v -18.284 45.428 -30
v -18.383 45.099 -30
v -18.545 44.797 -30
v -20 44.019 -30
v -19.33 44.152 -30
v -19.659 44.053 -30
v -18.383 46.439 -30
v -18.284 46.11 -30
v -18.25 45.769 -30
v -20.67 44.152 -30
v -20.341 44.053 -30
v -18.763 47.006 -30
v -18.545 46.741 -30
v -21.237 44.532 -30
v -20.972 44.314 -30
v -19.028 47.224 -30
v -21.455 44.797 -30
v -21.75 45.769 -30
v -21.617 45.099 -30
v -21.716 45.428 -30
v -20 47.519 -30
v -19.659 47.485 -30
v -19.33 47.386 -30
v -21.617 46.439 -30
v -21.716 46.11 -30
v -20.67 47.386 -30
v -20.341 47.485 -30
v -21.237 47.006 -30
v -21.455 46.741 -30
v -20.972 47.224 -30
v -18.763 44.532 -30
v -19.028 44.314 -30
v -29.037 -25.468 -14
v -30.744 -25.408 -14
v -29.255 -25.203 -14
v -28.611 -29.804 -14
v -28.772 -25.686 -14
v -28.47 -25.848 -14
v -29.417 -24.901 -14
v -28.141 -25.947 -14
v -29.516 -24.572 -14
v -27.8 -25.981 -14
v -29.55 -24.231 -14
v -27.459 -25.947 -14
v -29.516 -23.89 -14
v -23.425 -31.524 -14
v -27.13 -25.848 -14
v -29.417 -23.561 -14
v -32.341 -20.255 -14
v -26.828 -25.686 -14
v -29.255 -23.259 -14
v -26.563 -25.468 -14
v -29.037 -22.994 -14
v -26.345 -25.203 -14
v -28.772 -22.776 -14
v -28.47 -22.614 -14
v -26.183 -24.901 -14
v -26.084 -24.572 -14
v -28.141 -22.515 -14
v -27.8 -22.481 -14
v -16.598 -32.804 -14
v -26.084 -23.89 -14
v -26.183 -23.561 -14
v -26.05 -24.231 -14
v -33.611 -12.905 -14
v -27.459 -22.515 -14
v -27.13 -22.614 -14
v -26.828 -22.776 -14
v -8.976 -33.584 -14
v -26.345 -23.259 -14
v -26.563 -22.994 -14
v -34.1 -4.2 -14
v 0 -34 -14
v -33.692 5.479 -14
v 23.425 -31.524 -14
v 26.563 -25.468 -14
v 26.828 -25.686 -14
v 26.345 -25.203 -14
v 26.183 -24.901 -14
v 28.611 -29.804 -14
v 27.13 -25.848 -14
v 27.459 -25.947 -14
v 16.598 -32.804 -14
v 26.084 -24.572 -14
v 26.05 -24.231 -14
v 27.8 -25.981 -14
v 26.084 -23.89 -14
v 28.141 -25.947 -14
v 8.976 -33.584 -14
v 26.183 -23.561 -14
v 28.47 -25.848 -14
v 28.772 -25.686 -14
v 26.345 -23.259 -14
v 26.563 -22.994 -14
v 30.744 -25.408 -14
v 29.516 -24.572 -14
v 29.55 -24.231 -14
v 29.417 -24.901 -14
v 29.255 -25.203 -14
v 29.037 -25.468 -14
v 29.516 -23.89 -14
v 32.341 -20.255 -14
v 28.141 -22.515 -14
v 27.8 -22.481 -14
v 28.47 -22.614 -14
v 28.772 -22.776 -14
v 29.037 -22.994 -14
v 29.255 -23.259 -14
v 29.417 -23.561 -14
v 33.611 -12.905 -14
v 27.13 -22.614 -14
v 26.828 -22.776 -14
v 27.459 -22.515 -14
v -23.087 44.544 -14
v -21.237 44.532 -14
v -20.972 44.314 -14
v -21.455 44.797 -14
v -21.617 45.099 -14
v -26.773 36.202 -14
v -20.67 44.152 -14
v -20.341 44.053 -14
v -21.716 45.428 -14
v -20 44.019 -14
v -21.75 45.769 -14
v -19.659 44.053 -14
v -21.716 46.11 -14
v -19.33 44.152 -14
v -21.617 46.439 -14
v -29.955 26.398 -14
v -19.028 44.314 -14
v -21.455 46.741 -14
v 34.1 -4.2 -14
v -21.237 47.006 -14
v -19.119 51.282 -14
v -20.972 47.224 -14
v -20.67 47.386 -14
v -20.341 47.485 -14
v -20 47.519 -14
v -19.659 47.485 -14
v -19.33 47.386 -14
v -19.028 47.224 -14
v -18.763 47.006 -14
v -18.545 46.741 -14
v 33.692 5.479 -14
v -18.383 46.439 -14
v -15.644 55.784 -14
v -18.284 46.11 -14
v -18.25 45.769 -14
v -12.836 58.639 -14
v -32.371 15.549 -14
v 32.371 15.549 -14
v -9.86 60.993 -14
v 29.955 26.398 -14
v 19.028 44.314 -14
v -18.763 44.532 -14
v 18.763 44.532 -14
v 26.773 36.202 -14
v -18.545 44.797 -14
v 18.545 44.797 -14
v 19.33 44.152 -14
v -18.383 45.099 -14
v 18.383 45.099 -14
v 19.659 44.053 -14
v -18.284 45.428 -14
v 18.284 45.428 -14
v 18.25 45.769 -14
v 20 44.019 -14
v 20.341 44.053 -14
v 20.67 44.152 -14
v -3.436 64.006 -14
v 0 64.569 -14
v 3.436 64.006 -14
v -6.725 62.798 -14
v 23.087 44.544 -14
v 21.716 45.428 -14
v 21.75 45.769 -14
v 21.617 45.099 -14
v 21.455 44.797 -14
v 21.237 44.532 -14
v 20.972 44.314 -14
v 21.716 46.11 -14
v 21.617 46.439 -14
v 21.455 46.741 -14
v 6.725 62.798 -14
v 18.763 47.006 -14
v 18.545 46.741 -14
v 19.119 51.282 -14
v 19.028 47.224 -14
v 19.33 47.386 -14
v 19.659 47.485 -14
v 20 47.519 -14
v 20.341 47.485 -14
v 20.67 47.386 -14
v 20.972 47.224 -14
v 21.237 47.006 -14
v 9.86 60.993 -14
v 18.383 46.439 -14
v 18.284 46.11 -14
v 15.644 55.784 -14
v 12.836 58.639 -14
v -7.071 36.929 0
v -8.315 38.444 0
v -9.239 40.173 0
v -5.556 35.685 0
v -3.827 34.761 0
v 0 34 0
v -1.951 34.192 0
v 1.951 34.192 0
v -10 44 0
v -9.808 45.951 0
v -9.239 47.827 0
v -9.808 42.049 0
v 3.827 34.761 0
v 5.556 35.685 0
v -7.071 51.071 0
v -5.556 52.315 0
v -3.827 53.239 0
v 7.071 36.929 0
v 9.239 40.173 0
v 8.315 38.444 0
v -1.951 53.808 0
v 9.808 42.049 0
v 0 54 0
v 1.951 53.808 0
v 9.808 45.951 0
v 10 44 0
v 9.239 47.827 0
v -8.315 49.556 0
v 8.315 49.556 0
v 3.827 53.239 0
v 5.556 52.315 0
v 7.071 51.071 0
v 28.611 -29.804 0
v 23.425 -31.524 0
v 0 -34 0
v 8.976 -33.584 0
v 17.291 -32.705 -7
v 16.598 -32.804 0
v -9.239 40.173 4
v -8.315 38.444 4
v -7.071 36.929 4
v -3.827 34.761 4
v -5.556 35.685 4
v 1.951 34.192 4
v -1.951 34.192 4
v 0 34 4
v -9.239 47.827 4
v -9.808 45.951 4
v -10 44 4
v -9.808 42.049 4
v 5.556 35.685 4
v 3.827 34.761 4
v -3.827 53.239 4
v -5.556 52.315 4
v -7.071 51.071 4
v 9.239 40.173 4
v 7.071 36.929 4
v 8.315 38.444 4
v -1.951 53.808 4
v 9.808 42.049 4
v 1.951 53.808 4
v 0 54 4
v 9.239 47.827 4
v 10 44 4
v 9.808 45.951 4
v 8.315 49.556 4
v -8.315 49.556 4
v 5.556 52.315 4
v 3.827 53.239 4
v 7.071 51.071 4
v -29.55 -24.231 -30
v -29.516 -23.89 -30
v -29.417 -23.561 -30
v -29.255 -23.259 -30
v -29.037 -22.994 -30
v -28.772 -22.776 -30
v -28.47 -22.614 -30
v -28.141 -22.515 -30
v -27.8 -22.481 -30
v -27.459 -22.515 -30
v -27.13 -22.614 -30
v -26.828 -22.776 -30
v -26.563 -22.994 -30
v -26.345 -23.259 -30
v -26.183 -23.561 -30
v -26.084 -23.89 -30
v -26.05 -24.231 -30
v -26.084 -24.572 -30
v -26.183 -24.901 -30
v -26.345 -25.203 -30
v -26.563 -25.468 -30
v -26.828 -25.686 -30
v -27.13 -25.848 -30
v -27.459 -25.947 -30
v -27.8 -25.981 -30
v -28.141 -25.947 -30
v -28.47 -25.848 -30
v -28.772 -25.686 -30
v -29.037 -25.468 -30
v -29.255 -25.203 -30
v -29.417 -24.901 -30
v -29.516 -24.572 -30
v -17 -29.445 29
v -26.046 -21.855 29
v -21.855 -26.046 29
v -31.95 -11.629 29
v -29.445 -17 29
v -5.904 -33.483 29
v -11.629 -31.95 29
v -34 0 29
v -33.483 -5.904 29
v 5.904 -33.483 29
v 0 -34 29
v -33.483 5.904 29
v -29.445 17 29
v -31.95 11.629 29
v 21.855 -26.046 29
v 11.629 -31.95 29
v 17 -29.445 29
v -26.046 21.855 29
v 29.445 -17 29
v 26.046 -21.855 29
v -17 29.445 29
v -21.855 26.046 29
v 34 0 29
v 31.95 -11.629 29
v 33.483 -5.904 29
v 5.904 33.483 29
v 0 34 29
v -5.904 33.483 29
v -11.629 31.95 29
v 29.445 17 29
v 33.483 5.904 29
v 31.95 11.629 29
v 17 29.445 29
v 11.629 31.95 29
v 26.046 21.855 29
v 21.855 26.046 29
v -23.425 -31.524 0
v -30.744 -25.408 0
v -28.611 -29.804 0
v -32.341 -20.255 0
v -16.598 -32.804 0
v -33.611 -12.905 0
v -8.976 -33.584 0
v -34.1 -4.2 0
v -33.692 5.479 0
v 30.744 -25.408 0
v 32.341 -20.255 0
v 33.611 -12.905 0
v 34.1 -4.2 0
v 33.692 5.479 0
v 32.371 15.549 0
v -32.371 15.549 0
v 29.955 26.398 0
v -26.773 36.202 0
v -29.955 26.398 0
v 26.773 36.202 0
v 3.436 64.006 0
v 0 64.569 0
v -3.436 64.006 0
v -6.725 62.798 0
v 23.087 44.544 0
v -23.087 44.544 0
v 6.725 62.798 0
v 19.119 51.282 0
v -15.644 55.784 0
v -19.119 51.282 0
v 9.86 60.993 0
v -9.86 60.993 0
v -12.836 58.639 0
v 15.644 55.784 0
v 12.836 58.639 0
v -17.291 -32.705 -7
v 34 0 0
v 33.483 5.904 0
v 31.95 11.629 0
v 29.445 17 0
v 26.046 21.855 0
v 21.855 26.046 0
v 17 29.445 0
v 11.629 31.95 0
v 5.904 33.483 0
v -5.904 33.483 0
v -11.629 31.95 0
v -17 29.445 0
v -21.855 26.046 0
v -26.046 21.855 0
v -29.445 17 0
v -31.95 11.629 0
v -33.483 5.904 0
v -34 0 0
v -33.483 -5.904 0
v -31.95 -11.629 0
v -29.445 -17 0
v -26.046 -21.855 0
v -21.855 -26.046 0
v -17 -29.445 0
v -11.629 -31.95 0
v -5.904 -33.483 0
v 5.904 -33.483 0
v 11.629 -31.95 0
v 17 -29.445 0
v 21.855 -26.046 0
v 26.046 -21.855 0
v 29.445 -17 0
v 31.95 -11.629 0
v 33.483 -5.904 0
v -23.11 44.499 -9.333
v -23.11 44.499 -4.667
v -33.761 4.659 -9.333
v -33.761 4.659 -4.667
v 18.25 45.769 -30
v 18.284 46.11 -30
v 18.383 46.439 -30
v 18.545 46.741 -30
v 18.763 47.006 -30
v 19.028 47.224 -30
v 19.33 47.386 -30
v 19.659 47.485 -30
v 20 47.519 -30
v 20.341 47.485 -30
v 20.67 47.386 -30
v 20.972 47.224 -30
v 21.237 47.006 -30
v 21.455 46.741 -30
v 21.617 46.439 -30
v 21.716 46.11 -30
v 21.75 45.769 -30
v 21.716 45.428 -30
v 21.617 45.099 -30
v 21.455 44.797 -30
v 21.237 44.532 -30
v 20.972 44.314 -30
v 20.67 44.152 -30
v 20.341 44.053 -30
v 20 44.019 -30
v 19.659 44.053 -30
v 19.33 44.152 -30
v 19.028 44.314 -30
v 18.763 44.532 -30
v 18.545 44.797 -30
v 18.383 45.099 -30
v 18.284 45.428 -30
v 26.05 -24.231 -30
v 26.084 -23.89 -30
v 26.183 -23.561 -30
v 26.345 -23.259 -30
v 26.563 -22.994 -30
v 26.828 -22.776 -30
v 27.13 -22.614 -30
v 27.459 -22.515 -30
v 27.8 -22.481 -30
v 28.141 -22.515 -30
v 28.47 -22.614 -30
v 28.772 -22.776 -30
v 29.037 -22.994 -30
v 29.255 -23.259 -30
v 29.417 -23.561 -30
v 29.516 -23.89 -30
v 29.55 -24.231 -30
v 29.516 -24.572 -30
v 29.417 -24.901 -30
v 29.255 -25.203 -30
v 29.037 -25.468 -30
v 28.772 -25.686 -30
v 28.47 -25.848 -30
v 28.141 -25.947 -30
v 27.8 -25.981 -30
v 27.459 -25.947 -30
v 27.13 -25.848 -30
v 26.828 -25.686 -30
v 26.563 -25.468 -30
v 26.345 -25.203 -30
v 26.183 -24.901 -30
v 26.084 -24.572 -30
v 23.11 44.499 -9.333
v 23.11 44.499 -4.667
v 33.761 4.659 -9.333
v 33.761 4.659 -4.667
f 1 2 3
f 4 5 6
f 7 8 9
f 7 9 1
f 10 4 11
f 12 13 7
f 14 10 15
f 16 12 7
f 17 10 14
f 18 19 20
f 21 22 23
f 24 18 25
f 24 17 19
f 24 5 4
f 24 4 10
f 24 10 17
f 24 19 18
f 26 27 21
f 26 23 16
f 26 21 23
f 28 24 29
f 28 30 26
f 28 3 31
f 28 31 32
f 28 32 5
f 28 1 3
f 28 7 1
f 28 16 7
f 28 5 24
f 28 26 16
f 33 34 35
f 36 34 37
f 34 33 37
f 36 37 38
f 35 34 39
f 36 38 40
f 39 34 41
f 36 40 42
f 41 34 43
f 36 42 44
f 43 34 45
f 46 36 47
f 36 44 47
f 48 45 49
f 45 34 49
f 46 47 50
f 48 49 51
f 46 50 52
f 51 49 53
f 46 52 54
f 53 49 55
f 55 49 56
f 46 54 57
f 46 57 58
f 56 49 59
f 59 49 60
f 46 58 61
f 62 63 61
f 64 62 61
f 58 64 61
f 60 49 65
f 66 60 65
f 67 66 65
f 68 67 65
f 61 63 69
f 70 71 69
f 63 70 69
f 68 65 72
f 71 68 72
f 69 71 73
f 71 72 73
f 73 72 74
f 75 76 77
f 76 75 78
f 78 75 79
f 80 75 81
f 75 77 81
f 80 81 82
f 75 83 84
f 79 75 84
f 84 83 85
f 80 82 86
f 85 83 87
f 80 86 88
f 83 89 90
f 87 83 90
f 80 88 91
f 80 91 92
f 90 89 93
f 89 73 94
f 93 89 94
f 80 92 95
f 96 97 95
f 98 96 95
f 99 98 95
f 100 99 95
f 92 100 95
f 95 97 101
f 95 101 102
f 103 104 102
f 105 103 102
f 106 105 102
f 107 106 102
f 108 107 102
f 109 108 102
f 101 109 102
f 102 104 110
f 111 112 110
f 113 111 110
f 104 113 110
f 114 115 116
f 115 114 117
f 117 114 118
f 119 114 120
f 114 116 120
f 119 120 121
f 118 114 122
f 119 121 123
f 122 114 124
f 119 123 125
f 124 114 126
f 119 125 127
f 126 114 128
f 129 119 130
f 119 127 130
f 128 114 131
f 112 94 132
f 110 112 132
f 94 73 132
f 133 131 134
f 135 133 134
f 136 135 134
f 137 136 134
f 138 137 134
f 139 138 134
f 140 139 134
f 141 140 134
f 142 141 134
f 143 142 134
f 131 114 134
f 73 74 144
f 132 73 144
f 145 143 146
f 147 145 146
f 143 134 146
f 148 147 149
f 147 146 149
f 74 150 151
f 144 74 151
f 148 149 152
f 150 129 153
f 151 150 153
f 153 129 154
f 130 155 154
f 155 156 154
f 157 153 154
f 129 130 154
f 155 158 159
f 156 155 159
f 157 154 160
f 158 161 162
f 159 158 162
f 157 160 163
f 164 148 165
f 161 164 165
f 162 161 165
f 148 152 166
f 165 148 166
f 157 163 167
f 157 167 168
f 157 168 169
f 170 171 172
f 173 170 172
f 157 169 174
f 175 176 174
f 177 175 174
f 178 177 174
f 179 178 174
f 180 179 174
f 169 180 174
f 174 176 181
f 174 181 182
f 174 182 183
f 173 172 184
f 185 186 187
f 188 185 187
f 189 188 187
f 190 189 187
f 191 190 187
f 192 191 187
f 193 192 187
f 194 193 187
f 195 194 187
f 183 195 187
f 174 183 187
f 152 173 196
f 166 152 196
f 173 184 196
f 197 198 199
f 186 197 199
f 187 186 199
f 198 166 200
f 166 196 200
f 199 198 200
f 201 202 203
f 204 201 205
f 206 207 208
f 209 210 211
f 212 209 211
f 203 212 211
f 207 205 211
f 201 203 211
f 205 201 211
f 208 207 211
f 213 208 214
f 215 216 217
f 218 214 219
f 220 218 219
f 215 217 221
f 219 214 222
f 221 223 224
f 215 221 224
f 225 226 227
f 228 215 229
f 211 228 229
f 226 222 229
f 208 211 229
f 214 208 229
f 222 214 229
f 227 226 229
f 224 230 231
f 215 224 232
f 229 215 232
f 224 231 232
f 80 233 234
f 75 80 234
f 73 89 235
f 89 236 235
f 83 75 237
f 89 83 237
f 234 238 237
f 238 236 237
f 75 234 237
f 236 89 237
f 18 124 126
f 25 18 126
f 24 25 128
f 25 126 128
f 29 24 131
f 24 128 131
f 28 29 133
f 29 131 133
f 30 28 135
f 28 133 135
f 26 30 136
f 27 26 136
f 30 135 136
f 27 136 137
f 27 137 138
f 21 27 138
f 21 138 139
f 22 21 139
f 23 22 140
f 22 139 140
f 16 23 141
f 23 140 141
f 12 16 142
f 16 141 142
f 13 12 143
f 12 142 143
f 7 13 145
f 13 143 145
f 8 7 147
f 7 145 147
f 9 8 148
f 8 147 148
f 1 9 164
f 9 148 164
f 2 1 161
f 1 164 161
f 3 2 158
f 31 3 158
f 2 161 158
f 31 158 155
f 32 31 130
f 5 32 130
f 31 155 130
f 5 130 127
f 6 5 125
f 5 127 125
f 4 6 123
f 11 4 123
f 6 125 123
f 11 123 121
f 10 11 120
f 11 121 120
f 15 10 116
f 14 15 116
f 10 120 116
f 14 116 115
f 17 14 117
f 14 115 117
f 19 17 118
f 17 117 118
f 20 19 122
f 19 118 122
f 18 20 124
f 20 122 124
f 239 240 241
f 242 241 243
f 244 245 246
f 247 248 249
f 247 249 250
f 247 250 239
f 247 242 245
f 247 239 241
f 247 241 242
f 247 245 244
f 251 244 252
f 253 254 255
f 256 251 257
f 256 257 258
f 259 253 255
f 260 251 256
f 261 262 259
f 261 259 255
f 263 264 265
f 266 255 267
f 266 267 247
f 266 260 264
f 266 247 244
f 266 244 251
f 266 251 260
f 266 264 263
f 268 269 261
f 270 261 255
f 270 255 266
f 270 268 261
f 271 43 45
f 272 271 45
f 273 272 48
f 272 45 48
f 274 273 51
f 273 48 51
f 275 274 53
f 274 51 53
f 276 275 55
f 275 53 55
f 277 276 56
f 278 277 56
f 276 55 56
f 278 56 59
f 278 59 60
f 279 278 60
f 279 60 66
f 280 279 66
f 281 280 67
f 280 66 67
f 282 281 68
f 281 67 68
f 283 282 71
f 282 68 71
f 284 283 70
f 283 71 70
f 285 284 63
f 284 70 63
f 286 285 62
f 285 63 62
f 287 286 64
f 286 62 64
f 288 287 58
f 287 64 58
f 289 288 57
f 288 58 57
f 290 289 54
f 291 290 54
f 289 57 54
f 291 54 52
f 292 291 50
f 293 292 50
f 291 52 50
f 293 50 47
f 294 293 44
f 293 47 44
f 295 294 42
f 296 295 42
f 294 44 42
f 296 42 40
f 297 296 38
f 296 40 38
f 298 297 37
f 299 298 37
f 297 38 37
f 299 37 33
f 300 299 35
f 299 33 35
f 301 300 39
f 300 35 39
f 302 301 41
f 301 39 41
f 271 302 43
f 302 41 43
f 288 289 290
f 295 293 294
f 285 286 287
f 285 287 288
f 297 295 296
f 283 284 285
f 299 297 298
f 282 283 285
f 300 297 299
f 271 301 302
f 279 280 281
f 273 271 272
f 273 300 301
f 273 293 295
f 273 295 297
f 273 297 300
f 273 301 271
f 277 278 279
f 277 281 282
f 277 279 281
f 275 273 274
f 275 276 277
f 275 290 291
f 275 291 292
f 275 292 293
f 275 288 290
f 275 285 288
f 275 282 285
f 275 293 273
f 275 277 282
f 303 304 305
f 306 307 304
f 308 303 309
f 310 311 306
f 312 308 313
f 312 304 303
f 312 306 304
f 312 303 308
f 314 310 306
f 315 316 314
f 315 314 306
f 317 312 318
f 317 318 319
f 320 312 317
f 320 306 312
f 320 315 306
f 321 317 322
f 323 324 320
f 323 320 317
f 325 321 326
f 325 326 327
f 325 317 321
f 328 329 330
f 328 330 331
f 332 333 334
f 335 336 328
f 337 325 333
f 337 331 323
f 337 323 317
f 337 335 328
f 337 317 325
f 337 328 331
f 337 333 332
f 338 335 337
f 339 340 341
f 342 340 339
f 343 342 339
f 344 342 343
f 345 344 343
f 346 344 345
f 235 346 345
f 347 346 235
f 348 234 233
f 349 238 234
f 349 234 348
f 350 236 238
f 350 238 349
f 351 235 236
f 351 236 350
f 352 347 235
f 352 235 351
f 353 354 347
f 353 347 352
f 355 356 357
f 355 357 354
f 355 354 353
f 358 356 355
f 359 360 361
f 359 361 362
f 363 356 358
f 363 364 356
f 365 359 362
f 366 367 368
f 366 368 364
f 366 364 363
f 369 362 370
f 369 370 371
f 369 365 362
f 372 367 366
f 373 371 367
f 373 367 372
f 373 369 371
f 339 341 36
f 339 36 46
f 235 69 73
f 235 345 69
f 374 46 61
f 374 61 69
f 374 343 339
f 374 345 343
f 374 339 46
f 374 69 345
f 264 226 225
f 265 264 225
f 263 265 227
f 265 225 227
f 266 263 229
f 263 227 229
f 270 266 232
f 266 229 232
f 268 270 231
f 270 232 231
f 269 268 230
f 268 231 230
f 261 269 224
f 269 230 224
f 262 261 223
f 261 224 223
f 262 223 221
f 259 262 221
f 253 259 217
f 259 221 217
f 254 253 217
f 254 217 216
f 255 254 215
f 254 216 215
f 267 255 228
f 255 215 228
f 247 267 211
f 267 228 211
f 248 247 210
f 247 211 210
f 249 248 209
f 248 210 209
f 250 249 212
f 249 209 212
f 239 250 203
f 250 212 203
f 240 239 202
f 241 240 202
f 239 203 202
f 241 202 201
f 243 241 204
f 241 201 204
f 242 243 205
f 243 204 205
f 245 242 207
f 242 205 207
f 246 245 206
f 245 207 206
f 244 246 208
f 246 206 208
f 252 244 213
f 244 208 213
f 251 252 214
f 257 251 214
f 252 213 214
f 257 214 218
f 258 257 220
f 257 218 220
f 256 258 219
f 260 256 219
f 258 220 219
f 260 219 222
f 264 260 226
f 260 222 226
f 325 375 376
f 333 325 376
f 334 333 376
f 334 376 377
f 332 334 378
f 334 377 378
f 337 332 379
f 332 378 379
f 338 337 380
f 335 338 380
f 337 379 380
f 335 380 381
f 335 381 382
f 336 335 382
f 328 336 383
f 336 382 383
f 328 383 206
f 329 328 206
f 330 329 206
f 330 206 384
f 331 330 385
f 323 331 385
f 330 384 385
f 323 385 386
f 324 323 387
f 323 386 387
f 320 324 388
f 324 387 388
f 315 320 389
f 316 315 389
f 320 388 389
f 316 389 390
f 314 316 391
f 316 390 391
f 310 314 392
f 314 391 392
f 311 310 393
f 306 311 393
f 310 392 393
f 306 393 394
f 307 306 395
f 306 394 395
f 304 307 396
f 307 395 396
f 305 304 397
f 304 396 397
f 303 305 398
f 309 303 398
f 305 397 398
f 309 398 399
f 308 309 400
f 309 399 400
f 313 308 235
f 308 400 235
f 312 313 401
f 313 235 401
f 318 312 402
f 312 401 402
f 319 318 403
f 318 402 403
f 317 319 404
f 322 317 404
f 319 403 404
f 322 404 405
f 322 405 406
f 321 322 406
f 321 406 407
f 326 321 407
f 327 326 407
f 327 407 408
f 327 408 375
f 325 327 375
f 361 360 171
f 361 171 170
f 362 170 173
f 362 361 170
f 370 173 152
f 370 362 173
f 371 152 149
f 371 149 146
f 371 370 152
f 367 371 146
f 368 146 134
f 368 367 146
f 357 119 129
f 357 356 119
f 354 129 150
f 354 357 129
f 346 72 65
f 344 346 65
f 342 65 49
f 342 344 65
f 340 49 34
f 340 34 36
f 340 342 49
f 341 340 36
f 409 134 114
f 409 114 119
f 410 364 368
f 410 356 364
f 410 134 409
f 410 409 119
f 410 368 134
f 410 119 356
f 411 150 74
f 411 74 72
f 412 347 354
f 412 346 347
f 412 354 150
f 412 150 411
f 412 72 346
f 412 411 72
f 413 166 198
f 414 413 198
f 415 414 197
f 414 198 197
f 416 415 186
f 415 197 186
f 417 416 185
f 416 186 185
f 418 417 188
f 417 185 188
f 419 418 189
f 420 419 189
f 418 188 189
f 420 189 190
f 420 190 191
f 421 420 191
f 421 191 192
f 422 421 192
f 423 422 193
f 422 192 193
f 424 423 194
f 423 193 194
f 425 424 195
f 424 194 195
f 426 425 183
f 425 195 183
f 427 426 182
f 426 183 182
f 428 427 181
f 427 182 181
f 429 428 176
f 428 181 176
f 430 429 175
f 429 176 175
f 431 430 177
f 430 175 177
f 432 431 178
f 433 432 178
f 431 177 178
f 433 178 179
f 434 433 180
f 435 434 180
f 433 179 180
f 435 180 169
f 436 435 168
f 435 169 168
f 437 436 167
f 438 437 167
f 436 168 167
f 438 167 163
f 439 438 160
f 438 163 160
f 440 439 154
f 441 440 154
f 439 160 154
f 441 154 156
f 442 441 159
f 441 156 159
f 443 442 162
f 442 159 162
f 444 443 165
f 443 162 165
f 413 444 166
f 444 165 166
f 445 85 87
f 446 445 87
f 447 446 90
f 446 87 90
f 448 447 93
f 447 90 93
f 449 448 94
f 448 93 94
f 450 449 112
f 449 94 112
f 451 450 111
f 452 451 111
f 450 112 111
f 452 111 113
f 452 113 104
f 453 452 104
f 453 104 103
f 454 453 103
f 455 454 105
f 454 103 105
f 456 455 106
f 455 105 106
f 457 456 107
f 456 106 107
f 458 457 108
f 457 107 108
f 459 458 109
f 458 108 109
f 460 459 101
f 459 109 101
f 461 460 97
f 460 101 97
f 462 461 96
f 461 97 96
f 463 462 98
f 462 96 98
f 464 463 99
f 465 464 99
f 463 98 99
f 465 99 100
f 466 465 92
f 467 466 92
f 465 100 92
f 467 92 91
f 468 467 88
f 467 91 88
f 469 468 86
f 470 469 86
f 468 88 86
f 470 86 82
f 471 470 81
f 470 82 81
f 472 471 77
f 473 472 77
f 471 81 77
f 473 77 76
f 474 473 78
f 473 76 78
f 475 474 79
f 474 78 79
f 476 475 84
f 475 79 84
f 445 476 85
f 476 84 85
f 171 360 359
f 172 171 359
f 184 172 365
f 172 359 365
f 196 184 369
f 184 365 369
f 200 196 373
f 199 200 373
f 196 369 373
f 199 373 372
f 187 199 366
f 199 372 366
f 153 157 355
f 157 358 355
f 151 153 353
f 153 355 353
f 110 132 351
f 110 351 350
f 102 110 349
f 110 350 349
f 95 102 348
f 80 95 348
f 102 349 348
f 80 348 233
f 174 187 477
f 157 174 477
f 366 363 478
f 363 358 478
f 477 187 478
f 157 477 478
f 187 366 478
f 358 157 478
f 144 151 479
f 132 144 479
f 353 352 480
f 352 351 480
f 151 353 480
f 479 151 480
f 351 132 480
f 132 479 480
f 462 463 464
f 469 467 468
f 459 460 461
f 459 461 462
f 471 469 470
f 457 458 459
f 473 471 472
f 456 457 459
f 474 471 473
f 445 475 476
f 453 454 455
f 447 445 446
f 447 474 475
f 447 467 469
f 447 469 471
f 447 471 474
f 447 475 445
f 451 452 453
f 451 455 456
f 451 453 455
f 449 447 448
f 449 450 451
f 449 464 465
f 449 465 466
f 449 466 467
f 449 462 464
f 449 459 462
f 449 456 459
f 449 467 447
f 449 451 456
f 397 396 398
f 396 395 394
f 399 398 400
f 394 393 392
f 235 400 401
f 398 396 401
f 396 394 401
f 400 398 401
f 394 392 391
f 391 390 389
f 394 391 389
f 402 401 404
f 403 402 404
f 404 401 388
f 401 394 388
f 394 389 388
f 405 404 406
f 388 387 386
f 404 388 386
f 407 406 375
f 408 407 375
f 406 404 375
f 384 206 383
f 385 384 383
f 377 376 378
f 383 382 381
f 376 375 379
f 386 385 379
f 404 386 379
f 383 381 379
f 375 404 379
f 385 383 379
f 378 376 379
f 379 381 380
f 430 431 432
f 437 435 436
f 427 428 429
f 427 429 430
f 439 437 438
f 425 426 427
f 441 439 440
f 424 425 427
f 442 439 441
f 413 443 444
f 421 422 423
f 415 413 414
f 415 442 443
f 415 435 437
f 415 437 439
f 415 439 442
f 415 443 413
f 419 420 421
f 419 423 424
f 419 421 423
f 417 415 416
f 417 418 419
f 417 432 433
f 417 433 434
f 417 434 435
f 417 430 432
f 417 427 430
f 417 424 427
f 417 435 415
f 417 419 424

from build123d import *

# Parameters (mm, degrees)
SKETCH_1_R      = 34
EXTRUDE_2_DEPTH = 29
SKETCH_4_R      = 10
EXTRUDE_3_DEPTH = 4
EXTRUDE_5_DEPTH = 14
SKETCH_6_R      = 1.75
EXTRUDE_6_DEPTH = 16


with BuildPart() as part:
    # 草圖1 → 填料-伸長2 (new body)
    with BuildSketch(Plane.XY):
        Circle(SKETCH_1_R)
    extrude(amount=EXTRUDE_2_DEPTH)


with BuildPart() as body_2:
    # 草圖4 → 填料-伸長3 (new body)
    with BuildSketch(Plane.XY):
        with Locations((0, 44)):
            Circle(SKETCH_4_R)
    extrude(amount=EXTRUDE_3_DEPTH)


with BuildPart() as body_3:
    # 草圖5 → 填料-伸長5 (new body)
    with BuildSketch(Plane.XY):
        with BuildLine():
            add(Edge.make_bspline(
                [(0, 64.568950884), (-28.225840656, 62.766812112), (-42.774005852, -6.412874016), (-28.611317762, -29.803697061)],
                knots=[0, 0, 0, 0, 1, 1, 1, 1], degree=3))
            add(Edge.make_bspline(
                [(-28.611317762, -29.803697061), (-20.277297815, -33.507705927), (0, -34)],
                knots=[0, 0, 0, 1, 1, 1], degree=2))
            add(Edge.make_bspline(
                [(28.611317762, -29.803697061), (20.277297815, -33.507705927), (0, -34)],
                knots=[0, 0, 0, 1, 1, 1], degree=2))
            add(Edge.make_bspline(
                [(0, 64.568950884), (28.225840656, 62.766812112), (42.774005852, -6.412874016), (28.611317762, -29.803697061)],
                knots=[0, 0, 0, 0, 1, 1, 1, 1], degree=3))
        make_face()
    extrude(amount=-EXTRUDE_5_DEPTH)

    # 草圖6 → 填料-伸長6 (add)
    with BuildSketch(Plane(origin=(0, 0, -14), x_dir=(-1, 0, 0), z_dir=(0, 0, -1))):
        with Locations((-27.8, -24.231049116)):
            Circle(SKETCH_6_R)
        with Locations((27.8, -24.231049116)):
            Circle(SKETCH_6_R)
        with Locations((-20, 45.768950884)):
            Circle(SKETCH_6_R)
        with Locations((20, 45.768950884)):
            Circle(SKETCH_6_R)
    extrude(amount=EXTRUDE_6_DEPTH)


solid = Compound([part.part, body_2.part, body_3.part])
